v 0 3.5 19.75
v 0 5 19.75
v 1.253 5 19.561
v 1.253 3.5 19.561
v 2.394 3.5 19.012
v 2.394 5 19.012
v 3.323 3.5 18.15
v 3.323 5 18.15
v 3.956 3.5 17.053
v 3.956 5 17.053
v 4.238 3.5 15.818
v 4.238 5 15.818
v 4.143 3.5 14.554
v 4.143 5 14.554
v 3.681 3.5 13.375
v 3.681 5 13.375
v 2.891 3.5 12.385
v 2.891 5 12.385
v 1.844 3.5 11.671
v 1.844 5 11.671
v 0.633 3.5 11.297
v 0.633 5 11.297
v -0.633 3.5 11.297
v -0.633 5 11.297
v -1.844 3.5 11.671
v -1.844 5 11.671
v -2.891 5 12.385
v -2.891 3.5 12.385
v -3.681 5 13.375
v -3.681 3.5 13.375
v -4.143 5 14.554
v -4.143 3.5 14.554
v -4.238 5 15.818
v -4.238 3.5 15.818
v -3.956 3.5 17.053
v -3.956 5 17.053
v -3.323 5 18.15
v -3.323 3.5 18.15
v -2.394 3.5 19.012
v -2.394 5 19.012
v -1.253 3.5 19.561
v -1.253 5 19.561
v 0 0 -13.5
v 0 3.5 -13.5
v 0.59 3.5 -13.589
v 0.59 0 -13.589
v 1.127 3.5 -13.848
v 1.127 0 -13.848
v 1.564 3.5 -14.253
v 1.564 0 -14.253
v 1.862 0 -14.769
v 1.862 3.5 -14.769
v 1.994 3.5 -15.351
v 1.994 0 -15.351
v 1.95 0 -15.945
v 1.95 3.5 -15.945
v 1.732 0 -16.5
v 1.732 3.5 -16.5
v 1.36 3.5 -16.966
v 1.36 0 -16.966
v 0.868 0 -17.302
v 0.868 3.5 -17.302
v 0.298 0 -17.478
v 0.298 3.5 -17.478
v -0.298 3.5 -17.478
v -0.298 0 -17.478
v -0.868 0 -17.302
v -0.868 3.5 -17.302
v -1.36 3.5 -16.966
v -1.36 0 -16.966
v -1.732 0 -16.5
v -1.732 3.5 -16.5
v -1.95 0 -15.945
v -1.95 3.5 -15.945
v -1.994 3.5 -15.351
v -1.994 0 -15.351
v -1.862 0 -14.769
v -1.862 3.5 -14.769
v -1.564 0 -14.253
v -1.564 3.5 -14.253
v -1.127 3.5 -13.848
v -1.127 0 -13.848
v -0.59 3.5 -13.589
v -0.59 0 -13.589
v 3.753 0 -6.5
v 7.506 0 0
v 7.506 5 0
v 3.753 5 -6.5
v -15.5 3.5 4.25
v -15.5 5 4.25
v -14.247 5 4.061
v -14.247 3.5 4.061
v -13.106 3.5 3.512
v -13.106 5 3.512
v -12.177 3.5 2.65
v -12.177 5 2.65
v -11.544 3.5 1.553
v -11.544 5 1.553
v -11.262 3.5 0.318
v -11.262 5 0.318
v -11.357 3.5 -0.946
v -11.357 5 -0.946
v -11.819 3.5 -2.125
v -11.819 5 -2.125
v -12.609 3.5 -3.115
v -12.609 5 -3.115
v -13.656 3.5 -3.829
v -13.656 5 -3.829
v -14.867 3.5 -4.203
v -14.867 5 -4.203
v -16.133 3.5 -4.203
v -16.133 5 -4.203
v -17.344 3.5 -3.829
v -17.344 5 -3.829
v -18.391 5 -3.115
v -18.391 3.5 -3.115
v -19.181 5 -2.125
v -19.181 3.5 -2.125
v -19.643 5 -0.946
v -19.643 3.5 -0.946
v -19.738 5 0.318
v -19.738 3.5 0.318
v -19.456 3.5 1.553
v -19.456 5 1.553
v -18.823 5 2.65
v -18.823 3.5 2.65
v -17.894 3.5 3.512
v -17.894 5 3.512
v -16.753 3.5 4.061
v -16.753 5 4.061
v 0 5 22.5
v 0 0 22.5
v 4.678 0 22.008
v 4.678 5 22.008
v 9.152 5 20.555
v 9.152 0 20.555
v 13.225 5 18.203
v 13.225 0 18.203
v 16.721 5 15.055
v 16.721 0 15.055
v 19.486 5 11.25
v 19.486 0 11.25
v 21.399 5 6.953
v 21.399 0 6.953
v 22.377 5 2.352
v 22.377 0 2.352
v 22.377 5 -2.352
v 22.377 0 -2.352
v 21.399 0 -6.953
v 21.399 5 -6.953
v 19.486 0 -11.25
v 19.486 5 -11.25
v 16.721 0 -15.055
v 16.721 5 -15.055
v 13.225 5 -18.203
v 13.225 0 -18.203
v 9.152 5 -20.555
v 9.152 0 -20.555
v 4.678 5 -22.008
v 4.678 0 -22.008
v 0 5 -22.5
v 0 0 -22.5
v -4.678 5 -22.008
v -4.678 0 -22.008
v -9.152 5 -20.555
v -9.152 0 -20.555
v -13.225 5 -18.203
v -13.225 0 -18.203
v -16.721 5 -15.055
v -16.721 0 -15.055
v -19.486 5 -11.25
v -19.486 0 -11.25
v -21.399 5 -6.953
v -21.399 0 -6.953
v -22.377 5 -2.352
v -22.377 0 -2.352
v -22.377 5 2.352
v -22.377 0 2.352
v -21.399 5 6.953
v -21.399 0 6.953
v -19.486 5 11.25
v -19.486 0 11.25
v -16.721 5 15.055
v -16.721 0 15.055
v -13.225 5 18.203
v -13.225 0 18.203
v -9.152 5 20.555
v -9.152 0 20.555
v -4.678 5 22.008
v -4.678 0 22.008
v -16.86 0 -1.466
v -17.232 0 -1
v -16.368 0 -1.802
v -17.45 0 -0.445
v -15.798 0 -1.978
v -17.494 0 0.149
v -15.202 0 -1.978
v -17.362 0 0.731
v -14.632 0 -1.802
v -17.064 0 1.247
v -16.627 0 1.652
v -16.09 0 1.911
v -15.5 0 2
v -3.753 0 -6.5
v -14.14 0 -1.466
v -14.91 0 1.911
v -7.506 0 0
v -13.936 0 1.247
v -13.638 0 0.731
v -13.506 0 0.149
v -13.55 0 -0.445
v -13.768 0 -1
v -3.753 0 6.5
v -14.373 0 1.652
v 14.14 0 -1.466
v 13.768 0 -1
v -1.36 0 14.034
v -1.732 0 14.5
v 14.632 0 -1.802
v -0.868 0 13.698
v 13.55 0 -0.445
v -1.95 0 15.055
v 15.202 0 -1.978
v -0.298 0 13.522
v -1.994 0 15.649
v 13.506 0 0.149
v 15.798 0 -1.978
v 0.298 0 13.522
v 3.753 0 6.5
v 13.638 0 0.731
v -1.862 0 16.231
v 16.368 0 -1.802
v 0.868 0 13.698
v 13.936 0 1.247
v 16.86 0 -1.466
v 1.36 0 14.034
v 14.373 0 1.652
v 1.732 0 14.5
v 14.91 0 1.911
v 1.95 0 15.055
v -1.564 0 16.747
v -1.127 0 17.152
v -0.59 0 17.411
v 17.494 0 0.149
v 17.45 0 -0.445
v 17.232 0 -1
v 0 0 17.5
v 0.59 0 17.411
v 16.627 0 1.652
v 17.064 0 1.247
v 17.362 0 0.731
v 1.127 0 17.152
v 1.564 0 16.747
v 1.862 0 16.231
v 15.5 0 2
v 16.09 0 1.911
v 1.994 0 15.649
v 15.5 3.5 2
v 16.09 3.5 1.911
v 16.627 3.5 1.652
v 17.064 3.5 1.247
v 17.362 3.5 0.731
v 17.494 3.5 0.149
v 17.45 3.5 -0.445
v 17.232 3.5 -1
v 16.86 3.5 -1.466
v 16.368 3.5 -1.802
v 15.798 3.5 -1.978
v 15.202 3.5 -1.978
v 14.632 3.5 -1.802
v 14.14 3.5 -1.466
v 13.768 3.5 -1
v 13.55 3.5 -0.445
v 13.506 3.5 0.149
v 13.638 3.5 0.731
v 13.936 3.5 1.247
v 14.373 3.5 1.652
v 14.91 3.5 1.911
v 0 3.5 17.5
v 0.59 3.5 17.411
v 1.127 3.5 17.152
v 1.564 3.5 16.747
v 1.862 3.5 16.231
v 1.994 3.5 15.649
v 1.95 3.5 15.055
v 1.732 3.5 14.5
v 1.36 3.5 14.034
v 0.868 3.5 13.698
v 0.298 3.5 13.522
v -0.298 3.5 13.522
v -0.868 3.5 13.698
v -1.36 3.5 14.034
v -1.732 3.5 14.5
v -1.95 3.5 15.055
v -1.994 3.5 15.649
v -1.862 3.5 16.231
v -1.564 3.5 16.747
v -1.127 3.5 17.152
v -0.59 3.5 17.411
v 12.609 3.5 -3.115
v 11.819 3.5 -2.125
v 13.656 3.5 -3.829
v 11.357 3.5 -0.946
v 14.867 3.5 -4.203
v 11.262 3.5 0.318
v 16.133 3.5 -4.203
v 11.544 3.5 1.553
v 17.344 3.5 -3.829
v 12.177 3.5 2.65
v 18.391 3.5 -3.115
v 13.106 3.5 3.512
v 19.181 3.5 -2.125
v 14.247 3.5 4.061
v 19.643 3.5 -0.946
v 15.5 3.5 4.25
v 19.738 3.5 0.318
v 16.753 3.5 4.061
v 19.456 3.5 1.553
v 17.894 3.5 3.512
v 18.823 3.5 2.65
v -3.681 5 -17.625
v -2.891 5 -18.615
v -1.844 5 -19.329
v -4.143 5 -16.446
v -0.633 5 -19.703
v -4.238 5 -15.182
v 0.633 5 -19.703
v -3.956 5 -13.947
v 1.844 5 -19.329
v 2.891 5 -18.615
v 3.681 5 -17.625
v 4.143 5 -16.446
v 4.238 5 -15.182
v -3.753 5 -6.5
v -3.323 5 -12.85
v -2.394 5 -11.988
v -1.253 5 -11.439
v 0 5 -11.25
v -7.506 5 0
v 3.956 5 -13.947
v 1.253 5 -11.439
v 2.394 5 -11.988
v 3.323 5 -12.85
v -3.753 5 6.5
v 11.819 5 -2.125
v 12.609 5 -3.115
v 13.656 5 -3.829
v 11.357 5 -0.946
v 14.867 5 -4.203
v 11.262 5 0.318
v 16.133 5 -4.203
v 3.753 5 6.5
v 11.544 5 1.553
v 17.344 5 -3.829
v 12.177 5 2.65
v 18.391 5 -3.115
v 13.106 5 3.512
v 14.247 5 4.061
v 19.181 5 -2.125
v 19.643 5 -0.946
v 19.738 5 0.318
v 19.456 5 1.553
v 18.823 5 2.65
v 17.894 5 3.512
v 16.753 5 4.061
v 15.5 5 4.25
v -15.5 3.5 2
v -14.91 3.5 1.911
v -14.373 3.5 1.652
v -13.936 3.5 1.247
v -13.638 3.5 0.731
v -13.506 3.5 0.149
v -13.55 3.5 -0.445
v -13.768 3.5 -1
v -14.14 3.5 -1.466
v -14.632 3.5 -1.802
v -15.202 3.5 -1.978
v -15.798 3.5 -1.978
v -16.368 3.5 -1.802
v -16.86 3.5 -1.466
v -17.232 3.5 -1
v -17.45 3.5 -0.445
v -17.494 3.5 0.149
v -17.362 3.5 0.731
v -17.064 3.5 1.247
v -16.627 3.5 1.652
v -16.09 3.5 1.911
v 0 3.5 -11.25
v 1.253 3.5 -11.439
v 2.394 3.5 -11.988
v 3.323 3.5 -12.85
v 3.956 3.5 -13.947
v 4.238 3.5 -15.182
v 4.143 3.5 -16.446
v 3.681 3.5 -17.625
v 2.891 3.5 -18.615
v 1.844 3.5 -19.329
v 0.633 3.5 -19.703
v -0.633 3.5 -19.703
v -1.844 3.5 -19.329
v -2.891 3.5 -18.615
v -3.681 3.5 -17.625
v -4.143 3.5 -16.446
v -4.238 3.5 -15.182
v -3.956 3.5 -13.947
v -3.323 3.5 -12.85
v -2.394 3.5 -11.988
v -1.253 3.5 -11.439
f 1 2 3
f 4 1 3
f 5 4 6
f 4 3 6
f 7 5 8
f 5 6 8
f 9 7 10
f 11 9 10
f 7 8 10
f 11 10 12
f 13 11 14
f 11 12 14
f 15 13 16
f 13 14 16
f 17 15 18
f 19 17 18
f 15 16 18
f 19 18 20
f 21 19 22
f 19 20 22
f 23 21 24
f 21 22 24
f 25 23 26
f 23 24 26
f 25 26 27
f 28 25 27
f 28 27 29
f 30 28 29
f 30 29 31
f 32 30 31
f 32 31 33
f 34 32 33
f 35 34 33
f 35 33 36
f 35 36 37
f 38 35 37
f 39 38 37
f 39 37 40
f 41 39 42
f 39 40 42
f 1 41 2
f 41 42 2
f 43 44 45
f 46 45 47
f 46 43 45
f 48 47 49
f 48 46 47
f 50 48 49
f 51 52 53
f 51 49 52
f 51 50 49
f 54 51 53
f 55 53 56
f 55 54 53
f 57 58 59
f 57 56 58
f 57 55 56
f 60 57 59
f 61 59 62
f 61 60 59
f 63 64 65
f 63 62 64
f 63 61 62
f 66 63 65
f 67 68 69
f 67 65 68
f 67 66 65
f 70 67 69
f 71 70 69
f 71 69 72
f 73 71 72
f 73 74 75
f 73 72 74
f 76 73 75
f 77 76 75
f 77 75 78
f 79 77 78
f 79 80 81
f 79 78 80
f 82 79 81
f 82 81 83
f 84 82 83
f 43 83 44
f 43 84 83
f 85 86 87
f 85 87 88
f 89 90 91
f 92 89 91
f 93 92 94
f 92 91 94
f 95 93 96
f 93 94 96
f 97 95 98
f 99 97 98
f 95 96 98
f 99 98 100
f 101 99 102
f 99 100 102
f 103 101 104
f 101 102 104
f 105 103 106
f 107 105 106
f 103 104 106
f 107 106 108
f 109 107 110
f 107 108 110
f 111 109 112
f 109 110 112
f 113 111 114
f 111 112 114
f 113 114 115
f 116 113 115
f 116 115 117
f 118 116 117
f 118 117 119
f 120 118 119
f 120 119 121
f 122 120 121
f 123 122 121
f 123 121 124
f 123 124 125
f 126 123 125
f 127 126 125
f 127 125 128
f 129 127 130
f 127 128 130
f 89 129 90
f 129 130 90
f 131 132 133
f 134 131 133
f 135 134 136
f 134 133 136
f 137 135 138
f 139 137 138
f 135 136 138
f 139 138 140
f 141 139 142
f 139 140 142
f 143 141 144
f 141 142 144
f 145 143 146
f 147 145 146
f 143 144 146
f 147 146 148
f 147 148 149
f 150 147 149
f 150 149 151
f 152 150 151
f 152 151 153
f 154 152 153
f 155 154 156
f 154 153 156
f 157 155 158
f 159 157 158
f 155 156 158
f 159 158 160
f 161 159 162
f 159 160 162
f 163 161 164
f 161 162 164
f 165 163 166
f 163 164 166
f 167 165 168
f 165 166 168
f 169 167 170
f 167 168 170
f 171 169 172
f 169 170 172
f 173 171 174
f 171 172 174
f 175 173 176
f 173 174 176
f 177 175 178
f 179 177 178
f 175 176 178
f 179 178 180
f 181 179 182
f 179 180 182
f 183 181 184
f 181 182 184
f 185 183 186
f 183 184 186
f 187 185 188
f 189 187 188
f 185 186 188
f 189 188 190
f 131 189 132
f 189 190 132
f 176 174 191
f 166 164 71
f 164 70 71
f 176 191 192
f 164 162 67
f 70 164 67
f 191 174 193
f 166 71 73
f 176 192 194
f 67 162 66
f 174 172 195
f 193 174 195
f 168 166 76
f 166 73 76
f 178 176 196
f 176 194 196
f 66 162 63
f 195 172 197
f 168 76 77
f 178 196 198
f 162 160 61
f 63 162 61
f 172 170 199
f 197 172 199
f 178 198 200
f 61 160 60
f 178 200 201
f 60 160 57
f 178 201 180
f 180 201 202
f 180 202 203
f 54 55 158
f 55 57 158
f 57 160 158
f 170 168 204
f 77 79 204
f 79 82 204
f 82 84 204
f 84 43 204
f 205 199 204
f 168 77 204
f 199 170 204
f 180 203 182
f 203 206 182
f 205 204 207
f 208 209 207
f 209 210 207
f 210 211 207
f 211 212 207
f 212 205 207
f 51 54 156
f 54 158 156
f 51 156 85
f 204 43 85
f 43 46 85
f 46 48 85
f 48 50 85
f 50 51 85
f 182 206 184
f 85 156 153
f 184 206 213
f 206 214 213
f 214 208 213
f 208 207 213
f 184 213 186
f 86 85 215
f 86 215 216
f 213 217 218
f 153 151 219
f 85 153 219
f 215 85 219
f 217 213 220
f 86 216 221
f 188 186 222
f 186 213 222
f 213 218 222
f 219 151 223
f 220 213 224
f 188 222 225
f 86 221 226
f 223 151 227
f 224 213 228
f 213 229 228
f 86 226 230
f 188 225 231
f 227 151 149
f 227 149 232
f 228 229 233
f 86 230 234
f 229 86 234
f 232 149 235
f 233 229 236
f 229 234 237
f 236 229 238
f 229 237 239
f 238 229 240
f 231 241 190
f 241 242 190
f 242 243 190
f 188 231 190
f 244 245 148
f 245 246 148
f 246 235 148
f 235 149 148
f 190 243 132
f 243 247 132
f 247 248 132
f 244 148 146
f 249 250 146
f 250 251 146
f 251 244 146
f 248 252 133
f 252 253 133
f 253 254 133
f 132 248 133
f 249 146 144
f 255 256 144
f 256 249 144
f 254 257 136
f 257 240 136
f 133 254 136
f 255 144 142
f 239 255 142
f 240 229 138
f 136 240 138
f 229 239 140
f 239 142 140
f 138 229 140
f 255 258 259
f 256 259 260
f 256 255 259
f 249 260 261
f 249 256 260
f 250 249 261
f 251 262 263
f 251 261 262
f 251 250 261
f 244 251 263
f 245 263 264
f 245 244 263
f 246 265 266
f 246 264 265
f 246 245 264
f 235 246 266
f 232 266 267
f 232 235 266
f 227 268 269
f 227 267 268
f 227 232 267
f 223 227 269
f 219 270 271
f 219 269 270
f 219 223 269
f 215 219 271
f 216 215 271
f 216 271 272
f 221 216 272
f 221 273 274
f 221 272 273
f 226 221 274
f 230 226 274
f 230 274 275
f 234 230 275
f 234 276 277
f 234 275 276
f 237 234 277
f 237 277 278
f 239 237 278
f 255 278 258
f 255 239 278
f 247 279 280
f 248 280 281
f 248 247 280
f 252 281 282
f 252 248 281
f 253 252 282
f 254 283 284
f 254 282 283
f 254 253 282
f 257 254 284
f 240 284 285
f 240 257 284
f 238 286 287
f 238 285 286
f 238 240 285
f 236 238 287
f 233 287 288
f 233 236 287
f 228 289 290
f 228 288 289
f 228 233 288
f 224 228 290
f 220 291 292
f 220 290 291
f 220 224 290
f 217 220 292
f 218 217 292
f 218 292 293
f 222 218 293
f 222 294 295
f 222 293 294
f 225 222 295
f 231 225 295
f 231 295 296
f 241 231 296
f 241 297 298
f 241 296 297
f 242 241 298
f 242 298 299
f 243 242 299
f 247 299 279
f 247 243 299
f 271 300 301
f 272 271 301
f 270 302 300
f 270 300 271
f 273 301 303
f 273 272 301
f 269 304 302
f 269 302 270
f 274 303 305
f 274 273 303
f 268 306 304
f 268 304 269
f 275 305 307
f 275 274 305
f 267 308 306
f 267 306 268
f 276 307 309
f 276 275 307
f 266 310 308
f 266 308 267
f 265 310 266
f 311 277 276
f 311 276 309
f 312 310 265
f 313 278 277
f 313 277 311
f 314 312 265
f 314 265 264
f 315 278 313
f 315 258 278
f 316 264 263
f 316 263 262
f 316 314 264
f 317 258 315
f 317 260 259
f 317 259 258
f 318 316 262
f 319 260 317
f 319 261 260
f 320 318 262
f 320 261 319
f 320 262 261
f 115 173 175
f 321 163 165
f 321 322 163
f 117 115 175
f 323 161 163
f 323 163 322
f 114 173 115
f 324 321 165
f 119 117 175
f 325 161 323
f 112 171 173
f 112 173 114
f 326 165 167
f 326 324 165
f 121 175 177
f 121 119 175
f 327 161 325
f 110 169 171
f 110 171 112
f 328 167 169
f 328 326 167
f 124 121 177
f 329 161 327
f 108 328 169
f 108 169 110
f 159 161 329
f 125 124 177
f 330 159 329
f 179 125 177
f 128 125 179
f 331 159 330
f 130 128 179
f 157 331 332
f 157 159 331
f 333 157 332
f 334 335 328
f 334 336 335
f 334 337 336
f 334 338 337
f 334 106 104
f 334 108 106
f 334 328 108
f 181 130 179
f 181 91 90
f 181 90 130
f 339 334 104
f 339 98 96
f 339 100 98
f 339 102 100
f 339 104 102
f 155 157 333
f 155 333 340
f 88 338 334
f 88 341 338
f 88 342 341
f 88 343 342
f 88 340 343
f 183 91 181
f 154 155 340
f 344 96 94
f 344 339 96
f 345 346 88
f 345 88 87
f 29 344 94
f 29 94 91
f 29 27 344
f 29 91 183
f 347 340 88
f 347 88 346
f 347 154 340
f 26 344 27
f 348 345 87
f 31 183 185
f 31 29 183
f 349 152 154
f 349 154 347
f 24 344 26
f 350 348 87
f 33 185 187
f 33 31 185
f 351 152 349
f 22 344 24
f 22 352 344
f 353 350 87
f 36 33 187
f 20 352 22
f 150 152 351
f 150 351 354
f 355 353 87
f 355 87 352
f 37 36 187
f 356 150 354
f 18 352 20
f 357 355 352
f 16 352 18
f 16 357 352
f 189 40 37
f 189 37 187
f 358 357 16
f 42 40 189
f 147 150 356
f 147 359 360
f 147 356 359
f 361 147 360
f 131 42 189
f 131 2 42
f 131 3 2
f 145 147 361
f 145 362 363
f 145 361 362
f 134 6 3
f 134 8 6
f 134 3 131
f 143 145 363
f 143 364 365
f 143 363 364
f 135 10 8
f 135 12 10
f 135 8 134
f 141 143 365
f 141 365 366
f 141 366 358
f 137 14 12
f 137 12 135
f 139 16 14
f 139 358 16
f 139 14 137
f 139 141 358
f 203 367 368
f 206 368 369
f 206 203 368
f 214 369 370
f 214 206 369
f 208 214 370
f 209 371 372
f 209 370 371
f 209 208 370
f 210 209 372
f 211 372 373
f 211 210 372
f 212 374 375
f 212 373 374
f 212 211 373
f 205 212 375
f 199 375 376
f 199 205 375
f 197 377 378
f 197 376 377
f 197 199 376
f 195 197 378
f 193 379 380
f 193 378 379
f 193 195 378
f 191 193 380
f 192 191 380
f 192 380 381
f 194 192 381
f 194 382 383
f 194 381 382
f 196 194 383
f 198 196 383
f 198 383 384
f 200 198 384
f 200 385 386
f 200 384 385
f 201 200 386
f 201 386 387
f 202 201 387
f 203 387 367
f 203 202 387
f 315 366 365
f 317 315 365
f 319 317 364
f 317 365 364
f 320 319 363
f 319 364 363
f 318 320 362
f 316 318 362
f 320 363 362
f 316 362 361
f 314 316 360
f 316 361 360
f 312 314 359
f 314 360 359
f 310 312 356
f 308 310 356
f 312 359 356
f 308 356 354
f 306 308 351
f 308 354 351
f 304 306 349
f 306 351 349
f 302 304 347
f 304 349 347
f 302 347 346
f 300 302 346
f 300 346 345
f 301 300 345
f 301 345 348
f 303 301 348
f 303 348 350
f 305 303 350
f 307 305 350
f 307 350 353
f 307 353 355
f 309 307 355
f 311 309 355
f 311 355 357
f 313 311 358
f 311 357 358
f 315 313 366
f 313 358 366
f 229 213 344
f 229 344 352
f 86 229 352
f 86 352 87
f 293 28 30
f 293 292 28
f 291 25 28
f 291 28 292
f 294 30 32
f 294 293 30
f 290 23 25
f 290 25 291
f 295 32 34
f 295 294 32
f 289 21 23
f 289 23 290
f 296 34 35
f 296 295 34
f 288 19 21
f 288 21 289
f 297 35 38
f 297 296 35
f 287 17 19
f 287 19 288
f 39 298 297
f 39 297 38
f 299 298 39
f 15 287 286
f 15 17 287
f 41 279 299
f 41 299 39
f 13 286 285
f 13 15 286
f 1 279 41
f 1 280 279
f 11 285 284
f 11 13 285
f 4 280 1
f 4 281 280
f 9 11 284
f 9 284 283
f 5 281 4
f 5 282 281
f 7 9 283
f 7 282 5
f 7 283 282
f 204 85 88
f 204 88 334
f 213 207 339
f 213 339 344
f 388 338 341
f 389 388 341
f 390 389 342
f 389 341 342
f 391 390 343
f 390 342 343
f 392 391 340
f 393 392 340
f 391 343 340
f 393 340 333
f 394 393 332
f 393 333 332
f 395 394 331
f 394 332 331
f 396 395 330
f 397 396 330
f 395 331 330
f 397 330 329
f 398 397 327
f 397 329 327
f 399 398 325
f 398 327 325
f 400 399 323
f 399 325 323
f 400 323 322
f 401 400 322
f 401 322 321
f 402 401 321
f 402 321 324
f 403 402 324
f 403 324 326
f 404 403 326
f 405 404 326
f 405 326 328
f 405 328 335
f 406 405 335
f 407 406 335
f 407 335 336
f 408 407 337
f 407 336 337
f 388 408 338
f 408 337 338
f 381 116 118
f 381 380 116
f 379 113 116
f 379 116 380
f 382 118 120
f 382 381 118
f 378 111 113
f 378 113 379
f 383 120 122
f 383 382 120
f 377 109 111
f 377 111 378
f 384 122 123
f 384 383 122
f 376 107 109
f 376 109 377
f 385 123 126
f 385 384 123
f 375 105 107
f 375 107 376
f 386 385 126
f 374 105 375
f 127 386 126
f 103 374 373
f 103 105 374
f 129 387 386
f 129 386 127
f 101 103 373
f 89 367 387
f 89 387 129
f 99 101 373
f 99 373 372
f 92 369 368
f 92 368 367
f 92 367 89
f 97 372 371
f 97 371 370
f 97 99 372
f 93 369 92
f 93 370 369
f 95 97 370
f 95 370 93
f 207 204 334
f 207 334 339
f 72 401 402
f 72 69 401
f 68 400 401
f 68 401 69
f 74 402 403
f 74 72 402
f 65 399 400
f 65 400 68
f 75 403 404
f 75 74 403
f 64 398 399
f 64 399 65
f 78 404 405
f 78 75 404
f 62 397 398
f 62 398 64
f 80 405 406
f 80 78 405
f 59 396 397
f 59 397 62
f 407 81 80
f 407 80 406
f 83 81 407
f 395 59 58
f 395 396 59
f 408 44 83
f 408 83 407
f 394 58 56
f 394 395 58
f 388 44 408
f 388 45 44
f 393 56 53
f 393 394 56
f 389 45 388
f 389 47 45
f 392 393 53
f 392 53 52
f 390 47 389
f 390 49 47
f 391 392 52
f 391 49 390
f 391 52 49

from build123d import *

# Parameters (mm, degrees)
SKETCH1_R           = 22.5
SKETCH1_R_2         = 2
BOSS_EXTRUDE1_DEPTH = 5
SKETCH2_R           = 4.25
CUT_EXTRUDE1_DEPTH  = 1.5


with BuildPart() as part:
    # Sketch1 → Boss-Extrude1 (new body)
    with BuildSketch(Plane(origin=(0, 0, 0), x_dir=(1, 0, 0), z_dir=(0, 1, 0))):
        with Locations(Location((0, 0, 0), (0, 0, 270))):
            Circle(SKETCH1_R)
        with Locations(Location((0, 15.5, 0), (0, 0, 270))):
            Circle(SKETCH1_R_2, mode=Mode.SUBTRACT)
        with Locations(Location((15.5, 0, 0), (0, 0, 270))):
            Circle(SKETCH1_R_2, mode=Mode.SUBTRACT)
        with Locations(Location((0, -15.5, 0), (0, 0, 270))):
            Circle(SKETCH1_R_2, mode=Mode.SUBTRACT)
        with Locations(Location((-15.5, 0, 0), (0, 0, 270))):
            Circle(SKETCH1_R_2, mode=Mode.SUBTRACT)
        Polygon((7.505553499, 0), (3.75277675, 6.5), (-3.75277675, 6.5), (-7.505553499, 0), (-3.75277675, -6.5), (3.75277675, -6.5), align=None, mode=Mode.SUBTRACT)
    extrude(amount=BOSS_EXTRUDE1_DEPTH)

    # Sketch2 → Cut-Extrude1 (cut)
    with BuildSketch(Plane(origin=(0, 5, 0), x_dir=(1, 0, 0), z_dir=(0, 1, 0))):
        with Locations(Location((0, 15.5, 0), (0, 0, 270))):
            Circle(SKETCH2_R)
        with Locations(Location((15.5, 0, 0), (0, 0, 270))):
            Circle(SKETCH2_R)
        with Locations(Location((0, -15.5, 0), (0, 0, 270))):
            Circle(SKETCH2_R)
        with Locations(Location((-15.5, 0, 0), (0, 0, 270))):
            Circle(SKETCH2_R)
    extrude(amount=-CUT_EXTRUDE1_DEPTH, mode=Mode.SUBTRACT)


solid = part.part
